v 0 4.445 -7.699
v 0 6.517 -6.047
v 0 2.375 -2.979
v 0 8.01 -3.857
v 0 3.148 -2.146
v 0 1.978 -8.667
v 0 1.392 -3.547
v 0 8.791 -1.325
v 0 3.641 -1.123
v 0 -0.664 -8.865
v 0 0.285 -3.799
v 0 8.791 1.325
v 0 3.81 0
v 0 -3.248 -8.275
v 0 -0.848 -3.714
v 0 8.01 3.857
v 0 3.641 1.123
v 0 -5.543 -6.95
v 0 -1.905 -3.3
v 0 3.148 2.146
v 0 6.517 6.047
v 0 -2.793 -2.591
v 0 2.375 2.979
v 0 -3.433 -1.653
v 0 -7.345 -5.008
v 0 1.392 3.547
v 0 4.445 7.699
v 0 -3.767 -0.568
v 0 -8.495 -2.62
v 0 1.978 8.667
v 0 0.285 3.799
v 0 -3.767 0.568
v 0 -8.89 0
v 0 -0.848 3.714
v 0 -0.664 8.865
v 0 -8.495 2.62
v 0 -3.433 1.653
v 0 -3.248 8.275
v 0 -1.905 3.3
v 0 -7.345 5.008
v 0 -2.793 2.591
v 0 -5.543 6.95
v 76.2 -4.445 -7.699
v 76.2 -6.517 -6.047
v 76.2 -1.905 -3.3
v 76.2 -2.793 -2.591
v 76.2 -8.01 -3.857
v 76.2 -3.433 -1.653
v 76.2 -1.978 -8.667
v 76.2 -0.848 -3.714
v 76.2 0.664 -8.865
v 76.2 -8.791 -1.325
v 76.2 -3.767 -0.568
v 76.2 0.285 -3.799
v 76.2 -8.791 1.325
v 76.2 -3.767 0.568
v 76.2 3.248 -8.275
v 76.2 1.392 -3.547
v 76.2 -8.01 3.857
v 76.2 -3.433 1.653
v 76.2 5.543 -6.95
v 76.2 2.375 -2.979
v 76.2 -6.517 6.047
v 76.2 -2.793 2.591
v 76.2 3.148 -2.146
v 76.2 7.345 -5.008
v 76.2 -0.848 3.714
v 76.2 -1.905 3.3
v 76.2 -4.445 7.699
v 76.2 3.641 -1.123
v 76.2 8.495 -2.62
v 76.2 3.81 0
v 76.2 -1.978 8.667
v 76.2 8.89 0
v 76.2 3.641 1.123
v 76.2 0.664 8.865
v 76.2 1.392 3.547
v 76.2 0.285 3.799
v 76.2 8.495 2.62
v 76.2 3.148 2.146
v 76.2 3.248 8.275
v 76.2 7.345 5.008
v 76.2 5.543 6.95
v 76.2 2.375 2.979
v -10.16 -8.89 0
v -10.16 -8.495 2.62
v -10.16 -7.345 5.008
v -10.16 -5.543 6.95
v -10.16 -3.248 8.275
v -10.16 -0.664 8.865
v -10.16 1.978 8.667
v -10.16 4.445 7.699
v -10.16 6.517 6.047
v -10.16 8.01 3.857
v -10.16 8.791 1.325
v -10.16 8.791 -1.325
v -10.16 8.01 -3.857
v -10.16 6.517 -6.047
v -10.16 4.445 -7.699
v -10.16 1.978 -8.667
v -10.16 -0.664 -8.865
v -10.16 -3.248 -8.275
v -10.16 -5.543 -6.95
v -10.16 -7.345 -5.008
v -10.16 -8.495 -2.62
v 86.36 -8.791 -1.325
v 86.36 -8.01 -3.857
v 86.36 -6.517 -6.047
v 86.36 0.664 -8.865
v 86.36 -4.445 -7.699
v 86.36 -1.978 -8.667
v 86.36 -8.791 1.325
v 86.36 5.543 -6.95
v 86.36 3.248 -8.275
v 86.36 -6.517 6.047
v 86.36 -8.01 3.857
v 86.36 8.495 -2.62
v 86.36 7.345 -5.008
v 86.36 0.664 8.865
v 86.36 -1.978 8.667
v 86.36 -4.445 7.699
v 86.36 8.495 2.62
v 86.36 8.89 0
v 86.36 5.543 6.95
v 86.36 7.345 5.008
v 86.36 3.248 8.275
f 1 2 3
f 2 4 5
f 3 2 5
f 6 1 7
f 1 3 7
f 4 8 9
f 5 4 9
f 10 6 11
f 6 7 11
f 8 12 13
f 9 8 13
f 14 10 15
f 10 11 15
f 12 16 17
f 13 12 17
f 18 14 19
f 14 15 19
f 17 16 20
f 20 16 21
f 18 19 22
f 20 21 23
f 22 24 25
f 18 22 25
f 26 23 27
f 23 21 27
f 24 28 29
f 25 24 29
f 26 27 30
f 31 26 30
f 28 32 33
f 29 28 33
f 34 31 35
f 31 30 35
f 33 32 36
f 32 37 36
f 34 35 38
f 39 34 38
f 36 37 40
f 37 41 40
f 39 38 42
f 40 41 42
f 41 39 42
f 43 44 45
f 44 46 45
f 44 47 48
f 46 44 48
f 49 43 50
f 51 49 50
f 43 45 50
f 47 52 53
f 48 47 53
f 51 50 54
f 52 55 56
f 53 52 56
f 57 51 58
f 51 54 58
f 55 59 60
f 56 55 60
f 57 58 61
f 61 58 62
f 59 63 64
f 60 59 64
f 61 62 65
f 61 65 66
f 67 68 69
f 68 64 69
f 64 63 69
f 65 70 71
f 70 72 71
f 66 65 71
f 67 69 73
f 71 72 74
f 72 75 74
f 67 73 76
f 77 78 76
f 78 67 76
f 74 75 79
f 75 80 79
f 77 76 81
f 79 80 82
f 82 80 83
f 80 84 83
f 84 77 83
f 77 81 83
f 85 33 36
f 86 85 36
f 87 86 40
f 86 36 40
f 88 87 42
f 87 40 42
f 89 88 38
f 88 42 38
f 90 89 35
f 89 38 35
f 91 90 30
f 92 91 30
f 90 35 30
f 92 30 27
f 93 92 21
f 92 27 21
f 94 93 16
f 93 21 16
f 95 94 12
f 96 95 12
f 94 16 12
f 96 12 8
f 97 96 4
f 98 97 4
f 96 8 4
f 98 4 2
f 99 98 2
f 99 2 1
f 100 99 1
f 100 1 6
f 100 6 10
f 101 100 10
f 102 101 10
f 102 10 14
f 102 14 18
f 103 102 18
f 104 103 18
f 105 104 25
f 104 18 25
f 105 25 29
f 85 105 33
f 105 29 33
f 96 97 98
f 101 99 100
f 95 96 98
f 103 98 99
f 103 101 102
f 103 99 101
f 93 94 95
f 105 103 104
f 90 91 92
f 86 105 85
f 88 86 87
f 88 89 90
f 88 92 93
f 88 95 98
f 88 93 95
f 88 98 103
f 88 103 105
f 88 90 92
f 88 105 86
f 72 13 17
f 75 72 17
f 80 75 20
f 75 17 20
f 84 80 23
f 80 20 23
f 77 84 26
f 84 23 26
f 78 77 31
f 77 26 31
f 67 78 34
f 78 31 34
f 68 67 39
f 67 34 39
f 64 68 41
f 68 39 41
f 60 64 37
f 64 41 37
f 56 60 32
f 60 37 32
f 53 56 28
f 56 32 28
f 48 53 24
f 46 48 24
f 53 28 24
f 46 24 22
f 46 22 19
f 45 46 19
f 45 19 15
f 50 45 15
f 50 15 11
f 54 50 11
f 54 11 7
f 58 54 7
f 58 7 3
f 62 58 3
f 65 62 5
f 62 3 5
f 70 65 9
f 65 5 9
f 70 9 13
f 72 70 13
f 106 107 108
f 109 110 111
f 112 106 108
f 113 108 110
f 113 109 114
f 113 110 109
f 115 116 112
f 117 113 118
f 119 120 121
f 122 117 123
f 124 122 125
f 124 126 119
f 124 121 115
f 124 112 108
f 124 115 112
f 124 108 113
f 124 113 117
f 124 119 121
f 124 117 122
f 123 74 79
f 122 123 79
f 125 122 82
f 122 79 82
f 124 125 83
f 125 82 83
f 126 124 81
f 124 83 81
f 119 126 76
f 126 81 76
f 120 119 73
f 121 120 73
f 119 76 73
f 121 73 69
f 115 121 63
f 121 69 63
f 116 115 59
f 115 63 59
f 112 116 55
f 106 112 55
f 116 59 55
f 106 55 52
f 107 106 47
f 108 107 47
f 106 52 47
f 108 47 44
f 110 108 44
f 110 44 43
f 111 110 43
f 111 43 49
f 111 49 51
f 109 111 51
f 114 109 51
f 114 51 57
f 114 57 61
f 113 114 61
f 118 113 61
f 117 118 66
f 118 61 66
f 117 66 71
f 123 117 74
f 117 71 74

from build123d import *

# Parameters (mm, degrees)
F0_R     = 3.81
F1_DEPTH = 76.2
F3_R     = 8.89
F4_DEPTH = 10.16
F5_R     = 8.89
F6_DEPTH = 10.16


with BuildPart() as f1:
    # F0 (on Right) → F1 (new body)
    with BuildSketch(Plane.YZ):
        Circle(F0_R)
    extrude(amount=F1_DEPTH)

    # F3 (on face) → F4 (join)
    with BuildSketch(Plane(origin=(0, 0, 0), x_dir=(0, -1, 0), z_dir=(-1, 0, 0))):
        Circle(F3_R)
    extrude(amount=F4_DEPTH)

    # F5 (on face) → F6 (join)
    with BuildSketch(Plane.YZ.offset(76.2)):
        Circle(F5_R)
    extrude(amount=F6_DEPTH)


solid = f1.part
